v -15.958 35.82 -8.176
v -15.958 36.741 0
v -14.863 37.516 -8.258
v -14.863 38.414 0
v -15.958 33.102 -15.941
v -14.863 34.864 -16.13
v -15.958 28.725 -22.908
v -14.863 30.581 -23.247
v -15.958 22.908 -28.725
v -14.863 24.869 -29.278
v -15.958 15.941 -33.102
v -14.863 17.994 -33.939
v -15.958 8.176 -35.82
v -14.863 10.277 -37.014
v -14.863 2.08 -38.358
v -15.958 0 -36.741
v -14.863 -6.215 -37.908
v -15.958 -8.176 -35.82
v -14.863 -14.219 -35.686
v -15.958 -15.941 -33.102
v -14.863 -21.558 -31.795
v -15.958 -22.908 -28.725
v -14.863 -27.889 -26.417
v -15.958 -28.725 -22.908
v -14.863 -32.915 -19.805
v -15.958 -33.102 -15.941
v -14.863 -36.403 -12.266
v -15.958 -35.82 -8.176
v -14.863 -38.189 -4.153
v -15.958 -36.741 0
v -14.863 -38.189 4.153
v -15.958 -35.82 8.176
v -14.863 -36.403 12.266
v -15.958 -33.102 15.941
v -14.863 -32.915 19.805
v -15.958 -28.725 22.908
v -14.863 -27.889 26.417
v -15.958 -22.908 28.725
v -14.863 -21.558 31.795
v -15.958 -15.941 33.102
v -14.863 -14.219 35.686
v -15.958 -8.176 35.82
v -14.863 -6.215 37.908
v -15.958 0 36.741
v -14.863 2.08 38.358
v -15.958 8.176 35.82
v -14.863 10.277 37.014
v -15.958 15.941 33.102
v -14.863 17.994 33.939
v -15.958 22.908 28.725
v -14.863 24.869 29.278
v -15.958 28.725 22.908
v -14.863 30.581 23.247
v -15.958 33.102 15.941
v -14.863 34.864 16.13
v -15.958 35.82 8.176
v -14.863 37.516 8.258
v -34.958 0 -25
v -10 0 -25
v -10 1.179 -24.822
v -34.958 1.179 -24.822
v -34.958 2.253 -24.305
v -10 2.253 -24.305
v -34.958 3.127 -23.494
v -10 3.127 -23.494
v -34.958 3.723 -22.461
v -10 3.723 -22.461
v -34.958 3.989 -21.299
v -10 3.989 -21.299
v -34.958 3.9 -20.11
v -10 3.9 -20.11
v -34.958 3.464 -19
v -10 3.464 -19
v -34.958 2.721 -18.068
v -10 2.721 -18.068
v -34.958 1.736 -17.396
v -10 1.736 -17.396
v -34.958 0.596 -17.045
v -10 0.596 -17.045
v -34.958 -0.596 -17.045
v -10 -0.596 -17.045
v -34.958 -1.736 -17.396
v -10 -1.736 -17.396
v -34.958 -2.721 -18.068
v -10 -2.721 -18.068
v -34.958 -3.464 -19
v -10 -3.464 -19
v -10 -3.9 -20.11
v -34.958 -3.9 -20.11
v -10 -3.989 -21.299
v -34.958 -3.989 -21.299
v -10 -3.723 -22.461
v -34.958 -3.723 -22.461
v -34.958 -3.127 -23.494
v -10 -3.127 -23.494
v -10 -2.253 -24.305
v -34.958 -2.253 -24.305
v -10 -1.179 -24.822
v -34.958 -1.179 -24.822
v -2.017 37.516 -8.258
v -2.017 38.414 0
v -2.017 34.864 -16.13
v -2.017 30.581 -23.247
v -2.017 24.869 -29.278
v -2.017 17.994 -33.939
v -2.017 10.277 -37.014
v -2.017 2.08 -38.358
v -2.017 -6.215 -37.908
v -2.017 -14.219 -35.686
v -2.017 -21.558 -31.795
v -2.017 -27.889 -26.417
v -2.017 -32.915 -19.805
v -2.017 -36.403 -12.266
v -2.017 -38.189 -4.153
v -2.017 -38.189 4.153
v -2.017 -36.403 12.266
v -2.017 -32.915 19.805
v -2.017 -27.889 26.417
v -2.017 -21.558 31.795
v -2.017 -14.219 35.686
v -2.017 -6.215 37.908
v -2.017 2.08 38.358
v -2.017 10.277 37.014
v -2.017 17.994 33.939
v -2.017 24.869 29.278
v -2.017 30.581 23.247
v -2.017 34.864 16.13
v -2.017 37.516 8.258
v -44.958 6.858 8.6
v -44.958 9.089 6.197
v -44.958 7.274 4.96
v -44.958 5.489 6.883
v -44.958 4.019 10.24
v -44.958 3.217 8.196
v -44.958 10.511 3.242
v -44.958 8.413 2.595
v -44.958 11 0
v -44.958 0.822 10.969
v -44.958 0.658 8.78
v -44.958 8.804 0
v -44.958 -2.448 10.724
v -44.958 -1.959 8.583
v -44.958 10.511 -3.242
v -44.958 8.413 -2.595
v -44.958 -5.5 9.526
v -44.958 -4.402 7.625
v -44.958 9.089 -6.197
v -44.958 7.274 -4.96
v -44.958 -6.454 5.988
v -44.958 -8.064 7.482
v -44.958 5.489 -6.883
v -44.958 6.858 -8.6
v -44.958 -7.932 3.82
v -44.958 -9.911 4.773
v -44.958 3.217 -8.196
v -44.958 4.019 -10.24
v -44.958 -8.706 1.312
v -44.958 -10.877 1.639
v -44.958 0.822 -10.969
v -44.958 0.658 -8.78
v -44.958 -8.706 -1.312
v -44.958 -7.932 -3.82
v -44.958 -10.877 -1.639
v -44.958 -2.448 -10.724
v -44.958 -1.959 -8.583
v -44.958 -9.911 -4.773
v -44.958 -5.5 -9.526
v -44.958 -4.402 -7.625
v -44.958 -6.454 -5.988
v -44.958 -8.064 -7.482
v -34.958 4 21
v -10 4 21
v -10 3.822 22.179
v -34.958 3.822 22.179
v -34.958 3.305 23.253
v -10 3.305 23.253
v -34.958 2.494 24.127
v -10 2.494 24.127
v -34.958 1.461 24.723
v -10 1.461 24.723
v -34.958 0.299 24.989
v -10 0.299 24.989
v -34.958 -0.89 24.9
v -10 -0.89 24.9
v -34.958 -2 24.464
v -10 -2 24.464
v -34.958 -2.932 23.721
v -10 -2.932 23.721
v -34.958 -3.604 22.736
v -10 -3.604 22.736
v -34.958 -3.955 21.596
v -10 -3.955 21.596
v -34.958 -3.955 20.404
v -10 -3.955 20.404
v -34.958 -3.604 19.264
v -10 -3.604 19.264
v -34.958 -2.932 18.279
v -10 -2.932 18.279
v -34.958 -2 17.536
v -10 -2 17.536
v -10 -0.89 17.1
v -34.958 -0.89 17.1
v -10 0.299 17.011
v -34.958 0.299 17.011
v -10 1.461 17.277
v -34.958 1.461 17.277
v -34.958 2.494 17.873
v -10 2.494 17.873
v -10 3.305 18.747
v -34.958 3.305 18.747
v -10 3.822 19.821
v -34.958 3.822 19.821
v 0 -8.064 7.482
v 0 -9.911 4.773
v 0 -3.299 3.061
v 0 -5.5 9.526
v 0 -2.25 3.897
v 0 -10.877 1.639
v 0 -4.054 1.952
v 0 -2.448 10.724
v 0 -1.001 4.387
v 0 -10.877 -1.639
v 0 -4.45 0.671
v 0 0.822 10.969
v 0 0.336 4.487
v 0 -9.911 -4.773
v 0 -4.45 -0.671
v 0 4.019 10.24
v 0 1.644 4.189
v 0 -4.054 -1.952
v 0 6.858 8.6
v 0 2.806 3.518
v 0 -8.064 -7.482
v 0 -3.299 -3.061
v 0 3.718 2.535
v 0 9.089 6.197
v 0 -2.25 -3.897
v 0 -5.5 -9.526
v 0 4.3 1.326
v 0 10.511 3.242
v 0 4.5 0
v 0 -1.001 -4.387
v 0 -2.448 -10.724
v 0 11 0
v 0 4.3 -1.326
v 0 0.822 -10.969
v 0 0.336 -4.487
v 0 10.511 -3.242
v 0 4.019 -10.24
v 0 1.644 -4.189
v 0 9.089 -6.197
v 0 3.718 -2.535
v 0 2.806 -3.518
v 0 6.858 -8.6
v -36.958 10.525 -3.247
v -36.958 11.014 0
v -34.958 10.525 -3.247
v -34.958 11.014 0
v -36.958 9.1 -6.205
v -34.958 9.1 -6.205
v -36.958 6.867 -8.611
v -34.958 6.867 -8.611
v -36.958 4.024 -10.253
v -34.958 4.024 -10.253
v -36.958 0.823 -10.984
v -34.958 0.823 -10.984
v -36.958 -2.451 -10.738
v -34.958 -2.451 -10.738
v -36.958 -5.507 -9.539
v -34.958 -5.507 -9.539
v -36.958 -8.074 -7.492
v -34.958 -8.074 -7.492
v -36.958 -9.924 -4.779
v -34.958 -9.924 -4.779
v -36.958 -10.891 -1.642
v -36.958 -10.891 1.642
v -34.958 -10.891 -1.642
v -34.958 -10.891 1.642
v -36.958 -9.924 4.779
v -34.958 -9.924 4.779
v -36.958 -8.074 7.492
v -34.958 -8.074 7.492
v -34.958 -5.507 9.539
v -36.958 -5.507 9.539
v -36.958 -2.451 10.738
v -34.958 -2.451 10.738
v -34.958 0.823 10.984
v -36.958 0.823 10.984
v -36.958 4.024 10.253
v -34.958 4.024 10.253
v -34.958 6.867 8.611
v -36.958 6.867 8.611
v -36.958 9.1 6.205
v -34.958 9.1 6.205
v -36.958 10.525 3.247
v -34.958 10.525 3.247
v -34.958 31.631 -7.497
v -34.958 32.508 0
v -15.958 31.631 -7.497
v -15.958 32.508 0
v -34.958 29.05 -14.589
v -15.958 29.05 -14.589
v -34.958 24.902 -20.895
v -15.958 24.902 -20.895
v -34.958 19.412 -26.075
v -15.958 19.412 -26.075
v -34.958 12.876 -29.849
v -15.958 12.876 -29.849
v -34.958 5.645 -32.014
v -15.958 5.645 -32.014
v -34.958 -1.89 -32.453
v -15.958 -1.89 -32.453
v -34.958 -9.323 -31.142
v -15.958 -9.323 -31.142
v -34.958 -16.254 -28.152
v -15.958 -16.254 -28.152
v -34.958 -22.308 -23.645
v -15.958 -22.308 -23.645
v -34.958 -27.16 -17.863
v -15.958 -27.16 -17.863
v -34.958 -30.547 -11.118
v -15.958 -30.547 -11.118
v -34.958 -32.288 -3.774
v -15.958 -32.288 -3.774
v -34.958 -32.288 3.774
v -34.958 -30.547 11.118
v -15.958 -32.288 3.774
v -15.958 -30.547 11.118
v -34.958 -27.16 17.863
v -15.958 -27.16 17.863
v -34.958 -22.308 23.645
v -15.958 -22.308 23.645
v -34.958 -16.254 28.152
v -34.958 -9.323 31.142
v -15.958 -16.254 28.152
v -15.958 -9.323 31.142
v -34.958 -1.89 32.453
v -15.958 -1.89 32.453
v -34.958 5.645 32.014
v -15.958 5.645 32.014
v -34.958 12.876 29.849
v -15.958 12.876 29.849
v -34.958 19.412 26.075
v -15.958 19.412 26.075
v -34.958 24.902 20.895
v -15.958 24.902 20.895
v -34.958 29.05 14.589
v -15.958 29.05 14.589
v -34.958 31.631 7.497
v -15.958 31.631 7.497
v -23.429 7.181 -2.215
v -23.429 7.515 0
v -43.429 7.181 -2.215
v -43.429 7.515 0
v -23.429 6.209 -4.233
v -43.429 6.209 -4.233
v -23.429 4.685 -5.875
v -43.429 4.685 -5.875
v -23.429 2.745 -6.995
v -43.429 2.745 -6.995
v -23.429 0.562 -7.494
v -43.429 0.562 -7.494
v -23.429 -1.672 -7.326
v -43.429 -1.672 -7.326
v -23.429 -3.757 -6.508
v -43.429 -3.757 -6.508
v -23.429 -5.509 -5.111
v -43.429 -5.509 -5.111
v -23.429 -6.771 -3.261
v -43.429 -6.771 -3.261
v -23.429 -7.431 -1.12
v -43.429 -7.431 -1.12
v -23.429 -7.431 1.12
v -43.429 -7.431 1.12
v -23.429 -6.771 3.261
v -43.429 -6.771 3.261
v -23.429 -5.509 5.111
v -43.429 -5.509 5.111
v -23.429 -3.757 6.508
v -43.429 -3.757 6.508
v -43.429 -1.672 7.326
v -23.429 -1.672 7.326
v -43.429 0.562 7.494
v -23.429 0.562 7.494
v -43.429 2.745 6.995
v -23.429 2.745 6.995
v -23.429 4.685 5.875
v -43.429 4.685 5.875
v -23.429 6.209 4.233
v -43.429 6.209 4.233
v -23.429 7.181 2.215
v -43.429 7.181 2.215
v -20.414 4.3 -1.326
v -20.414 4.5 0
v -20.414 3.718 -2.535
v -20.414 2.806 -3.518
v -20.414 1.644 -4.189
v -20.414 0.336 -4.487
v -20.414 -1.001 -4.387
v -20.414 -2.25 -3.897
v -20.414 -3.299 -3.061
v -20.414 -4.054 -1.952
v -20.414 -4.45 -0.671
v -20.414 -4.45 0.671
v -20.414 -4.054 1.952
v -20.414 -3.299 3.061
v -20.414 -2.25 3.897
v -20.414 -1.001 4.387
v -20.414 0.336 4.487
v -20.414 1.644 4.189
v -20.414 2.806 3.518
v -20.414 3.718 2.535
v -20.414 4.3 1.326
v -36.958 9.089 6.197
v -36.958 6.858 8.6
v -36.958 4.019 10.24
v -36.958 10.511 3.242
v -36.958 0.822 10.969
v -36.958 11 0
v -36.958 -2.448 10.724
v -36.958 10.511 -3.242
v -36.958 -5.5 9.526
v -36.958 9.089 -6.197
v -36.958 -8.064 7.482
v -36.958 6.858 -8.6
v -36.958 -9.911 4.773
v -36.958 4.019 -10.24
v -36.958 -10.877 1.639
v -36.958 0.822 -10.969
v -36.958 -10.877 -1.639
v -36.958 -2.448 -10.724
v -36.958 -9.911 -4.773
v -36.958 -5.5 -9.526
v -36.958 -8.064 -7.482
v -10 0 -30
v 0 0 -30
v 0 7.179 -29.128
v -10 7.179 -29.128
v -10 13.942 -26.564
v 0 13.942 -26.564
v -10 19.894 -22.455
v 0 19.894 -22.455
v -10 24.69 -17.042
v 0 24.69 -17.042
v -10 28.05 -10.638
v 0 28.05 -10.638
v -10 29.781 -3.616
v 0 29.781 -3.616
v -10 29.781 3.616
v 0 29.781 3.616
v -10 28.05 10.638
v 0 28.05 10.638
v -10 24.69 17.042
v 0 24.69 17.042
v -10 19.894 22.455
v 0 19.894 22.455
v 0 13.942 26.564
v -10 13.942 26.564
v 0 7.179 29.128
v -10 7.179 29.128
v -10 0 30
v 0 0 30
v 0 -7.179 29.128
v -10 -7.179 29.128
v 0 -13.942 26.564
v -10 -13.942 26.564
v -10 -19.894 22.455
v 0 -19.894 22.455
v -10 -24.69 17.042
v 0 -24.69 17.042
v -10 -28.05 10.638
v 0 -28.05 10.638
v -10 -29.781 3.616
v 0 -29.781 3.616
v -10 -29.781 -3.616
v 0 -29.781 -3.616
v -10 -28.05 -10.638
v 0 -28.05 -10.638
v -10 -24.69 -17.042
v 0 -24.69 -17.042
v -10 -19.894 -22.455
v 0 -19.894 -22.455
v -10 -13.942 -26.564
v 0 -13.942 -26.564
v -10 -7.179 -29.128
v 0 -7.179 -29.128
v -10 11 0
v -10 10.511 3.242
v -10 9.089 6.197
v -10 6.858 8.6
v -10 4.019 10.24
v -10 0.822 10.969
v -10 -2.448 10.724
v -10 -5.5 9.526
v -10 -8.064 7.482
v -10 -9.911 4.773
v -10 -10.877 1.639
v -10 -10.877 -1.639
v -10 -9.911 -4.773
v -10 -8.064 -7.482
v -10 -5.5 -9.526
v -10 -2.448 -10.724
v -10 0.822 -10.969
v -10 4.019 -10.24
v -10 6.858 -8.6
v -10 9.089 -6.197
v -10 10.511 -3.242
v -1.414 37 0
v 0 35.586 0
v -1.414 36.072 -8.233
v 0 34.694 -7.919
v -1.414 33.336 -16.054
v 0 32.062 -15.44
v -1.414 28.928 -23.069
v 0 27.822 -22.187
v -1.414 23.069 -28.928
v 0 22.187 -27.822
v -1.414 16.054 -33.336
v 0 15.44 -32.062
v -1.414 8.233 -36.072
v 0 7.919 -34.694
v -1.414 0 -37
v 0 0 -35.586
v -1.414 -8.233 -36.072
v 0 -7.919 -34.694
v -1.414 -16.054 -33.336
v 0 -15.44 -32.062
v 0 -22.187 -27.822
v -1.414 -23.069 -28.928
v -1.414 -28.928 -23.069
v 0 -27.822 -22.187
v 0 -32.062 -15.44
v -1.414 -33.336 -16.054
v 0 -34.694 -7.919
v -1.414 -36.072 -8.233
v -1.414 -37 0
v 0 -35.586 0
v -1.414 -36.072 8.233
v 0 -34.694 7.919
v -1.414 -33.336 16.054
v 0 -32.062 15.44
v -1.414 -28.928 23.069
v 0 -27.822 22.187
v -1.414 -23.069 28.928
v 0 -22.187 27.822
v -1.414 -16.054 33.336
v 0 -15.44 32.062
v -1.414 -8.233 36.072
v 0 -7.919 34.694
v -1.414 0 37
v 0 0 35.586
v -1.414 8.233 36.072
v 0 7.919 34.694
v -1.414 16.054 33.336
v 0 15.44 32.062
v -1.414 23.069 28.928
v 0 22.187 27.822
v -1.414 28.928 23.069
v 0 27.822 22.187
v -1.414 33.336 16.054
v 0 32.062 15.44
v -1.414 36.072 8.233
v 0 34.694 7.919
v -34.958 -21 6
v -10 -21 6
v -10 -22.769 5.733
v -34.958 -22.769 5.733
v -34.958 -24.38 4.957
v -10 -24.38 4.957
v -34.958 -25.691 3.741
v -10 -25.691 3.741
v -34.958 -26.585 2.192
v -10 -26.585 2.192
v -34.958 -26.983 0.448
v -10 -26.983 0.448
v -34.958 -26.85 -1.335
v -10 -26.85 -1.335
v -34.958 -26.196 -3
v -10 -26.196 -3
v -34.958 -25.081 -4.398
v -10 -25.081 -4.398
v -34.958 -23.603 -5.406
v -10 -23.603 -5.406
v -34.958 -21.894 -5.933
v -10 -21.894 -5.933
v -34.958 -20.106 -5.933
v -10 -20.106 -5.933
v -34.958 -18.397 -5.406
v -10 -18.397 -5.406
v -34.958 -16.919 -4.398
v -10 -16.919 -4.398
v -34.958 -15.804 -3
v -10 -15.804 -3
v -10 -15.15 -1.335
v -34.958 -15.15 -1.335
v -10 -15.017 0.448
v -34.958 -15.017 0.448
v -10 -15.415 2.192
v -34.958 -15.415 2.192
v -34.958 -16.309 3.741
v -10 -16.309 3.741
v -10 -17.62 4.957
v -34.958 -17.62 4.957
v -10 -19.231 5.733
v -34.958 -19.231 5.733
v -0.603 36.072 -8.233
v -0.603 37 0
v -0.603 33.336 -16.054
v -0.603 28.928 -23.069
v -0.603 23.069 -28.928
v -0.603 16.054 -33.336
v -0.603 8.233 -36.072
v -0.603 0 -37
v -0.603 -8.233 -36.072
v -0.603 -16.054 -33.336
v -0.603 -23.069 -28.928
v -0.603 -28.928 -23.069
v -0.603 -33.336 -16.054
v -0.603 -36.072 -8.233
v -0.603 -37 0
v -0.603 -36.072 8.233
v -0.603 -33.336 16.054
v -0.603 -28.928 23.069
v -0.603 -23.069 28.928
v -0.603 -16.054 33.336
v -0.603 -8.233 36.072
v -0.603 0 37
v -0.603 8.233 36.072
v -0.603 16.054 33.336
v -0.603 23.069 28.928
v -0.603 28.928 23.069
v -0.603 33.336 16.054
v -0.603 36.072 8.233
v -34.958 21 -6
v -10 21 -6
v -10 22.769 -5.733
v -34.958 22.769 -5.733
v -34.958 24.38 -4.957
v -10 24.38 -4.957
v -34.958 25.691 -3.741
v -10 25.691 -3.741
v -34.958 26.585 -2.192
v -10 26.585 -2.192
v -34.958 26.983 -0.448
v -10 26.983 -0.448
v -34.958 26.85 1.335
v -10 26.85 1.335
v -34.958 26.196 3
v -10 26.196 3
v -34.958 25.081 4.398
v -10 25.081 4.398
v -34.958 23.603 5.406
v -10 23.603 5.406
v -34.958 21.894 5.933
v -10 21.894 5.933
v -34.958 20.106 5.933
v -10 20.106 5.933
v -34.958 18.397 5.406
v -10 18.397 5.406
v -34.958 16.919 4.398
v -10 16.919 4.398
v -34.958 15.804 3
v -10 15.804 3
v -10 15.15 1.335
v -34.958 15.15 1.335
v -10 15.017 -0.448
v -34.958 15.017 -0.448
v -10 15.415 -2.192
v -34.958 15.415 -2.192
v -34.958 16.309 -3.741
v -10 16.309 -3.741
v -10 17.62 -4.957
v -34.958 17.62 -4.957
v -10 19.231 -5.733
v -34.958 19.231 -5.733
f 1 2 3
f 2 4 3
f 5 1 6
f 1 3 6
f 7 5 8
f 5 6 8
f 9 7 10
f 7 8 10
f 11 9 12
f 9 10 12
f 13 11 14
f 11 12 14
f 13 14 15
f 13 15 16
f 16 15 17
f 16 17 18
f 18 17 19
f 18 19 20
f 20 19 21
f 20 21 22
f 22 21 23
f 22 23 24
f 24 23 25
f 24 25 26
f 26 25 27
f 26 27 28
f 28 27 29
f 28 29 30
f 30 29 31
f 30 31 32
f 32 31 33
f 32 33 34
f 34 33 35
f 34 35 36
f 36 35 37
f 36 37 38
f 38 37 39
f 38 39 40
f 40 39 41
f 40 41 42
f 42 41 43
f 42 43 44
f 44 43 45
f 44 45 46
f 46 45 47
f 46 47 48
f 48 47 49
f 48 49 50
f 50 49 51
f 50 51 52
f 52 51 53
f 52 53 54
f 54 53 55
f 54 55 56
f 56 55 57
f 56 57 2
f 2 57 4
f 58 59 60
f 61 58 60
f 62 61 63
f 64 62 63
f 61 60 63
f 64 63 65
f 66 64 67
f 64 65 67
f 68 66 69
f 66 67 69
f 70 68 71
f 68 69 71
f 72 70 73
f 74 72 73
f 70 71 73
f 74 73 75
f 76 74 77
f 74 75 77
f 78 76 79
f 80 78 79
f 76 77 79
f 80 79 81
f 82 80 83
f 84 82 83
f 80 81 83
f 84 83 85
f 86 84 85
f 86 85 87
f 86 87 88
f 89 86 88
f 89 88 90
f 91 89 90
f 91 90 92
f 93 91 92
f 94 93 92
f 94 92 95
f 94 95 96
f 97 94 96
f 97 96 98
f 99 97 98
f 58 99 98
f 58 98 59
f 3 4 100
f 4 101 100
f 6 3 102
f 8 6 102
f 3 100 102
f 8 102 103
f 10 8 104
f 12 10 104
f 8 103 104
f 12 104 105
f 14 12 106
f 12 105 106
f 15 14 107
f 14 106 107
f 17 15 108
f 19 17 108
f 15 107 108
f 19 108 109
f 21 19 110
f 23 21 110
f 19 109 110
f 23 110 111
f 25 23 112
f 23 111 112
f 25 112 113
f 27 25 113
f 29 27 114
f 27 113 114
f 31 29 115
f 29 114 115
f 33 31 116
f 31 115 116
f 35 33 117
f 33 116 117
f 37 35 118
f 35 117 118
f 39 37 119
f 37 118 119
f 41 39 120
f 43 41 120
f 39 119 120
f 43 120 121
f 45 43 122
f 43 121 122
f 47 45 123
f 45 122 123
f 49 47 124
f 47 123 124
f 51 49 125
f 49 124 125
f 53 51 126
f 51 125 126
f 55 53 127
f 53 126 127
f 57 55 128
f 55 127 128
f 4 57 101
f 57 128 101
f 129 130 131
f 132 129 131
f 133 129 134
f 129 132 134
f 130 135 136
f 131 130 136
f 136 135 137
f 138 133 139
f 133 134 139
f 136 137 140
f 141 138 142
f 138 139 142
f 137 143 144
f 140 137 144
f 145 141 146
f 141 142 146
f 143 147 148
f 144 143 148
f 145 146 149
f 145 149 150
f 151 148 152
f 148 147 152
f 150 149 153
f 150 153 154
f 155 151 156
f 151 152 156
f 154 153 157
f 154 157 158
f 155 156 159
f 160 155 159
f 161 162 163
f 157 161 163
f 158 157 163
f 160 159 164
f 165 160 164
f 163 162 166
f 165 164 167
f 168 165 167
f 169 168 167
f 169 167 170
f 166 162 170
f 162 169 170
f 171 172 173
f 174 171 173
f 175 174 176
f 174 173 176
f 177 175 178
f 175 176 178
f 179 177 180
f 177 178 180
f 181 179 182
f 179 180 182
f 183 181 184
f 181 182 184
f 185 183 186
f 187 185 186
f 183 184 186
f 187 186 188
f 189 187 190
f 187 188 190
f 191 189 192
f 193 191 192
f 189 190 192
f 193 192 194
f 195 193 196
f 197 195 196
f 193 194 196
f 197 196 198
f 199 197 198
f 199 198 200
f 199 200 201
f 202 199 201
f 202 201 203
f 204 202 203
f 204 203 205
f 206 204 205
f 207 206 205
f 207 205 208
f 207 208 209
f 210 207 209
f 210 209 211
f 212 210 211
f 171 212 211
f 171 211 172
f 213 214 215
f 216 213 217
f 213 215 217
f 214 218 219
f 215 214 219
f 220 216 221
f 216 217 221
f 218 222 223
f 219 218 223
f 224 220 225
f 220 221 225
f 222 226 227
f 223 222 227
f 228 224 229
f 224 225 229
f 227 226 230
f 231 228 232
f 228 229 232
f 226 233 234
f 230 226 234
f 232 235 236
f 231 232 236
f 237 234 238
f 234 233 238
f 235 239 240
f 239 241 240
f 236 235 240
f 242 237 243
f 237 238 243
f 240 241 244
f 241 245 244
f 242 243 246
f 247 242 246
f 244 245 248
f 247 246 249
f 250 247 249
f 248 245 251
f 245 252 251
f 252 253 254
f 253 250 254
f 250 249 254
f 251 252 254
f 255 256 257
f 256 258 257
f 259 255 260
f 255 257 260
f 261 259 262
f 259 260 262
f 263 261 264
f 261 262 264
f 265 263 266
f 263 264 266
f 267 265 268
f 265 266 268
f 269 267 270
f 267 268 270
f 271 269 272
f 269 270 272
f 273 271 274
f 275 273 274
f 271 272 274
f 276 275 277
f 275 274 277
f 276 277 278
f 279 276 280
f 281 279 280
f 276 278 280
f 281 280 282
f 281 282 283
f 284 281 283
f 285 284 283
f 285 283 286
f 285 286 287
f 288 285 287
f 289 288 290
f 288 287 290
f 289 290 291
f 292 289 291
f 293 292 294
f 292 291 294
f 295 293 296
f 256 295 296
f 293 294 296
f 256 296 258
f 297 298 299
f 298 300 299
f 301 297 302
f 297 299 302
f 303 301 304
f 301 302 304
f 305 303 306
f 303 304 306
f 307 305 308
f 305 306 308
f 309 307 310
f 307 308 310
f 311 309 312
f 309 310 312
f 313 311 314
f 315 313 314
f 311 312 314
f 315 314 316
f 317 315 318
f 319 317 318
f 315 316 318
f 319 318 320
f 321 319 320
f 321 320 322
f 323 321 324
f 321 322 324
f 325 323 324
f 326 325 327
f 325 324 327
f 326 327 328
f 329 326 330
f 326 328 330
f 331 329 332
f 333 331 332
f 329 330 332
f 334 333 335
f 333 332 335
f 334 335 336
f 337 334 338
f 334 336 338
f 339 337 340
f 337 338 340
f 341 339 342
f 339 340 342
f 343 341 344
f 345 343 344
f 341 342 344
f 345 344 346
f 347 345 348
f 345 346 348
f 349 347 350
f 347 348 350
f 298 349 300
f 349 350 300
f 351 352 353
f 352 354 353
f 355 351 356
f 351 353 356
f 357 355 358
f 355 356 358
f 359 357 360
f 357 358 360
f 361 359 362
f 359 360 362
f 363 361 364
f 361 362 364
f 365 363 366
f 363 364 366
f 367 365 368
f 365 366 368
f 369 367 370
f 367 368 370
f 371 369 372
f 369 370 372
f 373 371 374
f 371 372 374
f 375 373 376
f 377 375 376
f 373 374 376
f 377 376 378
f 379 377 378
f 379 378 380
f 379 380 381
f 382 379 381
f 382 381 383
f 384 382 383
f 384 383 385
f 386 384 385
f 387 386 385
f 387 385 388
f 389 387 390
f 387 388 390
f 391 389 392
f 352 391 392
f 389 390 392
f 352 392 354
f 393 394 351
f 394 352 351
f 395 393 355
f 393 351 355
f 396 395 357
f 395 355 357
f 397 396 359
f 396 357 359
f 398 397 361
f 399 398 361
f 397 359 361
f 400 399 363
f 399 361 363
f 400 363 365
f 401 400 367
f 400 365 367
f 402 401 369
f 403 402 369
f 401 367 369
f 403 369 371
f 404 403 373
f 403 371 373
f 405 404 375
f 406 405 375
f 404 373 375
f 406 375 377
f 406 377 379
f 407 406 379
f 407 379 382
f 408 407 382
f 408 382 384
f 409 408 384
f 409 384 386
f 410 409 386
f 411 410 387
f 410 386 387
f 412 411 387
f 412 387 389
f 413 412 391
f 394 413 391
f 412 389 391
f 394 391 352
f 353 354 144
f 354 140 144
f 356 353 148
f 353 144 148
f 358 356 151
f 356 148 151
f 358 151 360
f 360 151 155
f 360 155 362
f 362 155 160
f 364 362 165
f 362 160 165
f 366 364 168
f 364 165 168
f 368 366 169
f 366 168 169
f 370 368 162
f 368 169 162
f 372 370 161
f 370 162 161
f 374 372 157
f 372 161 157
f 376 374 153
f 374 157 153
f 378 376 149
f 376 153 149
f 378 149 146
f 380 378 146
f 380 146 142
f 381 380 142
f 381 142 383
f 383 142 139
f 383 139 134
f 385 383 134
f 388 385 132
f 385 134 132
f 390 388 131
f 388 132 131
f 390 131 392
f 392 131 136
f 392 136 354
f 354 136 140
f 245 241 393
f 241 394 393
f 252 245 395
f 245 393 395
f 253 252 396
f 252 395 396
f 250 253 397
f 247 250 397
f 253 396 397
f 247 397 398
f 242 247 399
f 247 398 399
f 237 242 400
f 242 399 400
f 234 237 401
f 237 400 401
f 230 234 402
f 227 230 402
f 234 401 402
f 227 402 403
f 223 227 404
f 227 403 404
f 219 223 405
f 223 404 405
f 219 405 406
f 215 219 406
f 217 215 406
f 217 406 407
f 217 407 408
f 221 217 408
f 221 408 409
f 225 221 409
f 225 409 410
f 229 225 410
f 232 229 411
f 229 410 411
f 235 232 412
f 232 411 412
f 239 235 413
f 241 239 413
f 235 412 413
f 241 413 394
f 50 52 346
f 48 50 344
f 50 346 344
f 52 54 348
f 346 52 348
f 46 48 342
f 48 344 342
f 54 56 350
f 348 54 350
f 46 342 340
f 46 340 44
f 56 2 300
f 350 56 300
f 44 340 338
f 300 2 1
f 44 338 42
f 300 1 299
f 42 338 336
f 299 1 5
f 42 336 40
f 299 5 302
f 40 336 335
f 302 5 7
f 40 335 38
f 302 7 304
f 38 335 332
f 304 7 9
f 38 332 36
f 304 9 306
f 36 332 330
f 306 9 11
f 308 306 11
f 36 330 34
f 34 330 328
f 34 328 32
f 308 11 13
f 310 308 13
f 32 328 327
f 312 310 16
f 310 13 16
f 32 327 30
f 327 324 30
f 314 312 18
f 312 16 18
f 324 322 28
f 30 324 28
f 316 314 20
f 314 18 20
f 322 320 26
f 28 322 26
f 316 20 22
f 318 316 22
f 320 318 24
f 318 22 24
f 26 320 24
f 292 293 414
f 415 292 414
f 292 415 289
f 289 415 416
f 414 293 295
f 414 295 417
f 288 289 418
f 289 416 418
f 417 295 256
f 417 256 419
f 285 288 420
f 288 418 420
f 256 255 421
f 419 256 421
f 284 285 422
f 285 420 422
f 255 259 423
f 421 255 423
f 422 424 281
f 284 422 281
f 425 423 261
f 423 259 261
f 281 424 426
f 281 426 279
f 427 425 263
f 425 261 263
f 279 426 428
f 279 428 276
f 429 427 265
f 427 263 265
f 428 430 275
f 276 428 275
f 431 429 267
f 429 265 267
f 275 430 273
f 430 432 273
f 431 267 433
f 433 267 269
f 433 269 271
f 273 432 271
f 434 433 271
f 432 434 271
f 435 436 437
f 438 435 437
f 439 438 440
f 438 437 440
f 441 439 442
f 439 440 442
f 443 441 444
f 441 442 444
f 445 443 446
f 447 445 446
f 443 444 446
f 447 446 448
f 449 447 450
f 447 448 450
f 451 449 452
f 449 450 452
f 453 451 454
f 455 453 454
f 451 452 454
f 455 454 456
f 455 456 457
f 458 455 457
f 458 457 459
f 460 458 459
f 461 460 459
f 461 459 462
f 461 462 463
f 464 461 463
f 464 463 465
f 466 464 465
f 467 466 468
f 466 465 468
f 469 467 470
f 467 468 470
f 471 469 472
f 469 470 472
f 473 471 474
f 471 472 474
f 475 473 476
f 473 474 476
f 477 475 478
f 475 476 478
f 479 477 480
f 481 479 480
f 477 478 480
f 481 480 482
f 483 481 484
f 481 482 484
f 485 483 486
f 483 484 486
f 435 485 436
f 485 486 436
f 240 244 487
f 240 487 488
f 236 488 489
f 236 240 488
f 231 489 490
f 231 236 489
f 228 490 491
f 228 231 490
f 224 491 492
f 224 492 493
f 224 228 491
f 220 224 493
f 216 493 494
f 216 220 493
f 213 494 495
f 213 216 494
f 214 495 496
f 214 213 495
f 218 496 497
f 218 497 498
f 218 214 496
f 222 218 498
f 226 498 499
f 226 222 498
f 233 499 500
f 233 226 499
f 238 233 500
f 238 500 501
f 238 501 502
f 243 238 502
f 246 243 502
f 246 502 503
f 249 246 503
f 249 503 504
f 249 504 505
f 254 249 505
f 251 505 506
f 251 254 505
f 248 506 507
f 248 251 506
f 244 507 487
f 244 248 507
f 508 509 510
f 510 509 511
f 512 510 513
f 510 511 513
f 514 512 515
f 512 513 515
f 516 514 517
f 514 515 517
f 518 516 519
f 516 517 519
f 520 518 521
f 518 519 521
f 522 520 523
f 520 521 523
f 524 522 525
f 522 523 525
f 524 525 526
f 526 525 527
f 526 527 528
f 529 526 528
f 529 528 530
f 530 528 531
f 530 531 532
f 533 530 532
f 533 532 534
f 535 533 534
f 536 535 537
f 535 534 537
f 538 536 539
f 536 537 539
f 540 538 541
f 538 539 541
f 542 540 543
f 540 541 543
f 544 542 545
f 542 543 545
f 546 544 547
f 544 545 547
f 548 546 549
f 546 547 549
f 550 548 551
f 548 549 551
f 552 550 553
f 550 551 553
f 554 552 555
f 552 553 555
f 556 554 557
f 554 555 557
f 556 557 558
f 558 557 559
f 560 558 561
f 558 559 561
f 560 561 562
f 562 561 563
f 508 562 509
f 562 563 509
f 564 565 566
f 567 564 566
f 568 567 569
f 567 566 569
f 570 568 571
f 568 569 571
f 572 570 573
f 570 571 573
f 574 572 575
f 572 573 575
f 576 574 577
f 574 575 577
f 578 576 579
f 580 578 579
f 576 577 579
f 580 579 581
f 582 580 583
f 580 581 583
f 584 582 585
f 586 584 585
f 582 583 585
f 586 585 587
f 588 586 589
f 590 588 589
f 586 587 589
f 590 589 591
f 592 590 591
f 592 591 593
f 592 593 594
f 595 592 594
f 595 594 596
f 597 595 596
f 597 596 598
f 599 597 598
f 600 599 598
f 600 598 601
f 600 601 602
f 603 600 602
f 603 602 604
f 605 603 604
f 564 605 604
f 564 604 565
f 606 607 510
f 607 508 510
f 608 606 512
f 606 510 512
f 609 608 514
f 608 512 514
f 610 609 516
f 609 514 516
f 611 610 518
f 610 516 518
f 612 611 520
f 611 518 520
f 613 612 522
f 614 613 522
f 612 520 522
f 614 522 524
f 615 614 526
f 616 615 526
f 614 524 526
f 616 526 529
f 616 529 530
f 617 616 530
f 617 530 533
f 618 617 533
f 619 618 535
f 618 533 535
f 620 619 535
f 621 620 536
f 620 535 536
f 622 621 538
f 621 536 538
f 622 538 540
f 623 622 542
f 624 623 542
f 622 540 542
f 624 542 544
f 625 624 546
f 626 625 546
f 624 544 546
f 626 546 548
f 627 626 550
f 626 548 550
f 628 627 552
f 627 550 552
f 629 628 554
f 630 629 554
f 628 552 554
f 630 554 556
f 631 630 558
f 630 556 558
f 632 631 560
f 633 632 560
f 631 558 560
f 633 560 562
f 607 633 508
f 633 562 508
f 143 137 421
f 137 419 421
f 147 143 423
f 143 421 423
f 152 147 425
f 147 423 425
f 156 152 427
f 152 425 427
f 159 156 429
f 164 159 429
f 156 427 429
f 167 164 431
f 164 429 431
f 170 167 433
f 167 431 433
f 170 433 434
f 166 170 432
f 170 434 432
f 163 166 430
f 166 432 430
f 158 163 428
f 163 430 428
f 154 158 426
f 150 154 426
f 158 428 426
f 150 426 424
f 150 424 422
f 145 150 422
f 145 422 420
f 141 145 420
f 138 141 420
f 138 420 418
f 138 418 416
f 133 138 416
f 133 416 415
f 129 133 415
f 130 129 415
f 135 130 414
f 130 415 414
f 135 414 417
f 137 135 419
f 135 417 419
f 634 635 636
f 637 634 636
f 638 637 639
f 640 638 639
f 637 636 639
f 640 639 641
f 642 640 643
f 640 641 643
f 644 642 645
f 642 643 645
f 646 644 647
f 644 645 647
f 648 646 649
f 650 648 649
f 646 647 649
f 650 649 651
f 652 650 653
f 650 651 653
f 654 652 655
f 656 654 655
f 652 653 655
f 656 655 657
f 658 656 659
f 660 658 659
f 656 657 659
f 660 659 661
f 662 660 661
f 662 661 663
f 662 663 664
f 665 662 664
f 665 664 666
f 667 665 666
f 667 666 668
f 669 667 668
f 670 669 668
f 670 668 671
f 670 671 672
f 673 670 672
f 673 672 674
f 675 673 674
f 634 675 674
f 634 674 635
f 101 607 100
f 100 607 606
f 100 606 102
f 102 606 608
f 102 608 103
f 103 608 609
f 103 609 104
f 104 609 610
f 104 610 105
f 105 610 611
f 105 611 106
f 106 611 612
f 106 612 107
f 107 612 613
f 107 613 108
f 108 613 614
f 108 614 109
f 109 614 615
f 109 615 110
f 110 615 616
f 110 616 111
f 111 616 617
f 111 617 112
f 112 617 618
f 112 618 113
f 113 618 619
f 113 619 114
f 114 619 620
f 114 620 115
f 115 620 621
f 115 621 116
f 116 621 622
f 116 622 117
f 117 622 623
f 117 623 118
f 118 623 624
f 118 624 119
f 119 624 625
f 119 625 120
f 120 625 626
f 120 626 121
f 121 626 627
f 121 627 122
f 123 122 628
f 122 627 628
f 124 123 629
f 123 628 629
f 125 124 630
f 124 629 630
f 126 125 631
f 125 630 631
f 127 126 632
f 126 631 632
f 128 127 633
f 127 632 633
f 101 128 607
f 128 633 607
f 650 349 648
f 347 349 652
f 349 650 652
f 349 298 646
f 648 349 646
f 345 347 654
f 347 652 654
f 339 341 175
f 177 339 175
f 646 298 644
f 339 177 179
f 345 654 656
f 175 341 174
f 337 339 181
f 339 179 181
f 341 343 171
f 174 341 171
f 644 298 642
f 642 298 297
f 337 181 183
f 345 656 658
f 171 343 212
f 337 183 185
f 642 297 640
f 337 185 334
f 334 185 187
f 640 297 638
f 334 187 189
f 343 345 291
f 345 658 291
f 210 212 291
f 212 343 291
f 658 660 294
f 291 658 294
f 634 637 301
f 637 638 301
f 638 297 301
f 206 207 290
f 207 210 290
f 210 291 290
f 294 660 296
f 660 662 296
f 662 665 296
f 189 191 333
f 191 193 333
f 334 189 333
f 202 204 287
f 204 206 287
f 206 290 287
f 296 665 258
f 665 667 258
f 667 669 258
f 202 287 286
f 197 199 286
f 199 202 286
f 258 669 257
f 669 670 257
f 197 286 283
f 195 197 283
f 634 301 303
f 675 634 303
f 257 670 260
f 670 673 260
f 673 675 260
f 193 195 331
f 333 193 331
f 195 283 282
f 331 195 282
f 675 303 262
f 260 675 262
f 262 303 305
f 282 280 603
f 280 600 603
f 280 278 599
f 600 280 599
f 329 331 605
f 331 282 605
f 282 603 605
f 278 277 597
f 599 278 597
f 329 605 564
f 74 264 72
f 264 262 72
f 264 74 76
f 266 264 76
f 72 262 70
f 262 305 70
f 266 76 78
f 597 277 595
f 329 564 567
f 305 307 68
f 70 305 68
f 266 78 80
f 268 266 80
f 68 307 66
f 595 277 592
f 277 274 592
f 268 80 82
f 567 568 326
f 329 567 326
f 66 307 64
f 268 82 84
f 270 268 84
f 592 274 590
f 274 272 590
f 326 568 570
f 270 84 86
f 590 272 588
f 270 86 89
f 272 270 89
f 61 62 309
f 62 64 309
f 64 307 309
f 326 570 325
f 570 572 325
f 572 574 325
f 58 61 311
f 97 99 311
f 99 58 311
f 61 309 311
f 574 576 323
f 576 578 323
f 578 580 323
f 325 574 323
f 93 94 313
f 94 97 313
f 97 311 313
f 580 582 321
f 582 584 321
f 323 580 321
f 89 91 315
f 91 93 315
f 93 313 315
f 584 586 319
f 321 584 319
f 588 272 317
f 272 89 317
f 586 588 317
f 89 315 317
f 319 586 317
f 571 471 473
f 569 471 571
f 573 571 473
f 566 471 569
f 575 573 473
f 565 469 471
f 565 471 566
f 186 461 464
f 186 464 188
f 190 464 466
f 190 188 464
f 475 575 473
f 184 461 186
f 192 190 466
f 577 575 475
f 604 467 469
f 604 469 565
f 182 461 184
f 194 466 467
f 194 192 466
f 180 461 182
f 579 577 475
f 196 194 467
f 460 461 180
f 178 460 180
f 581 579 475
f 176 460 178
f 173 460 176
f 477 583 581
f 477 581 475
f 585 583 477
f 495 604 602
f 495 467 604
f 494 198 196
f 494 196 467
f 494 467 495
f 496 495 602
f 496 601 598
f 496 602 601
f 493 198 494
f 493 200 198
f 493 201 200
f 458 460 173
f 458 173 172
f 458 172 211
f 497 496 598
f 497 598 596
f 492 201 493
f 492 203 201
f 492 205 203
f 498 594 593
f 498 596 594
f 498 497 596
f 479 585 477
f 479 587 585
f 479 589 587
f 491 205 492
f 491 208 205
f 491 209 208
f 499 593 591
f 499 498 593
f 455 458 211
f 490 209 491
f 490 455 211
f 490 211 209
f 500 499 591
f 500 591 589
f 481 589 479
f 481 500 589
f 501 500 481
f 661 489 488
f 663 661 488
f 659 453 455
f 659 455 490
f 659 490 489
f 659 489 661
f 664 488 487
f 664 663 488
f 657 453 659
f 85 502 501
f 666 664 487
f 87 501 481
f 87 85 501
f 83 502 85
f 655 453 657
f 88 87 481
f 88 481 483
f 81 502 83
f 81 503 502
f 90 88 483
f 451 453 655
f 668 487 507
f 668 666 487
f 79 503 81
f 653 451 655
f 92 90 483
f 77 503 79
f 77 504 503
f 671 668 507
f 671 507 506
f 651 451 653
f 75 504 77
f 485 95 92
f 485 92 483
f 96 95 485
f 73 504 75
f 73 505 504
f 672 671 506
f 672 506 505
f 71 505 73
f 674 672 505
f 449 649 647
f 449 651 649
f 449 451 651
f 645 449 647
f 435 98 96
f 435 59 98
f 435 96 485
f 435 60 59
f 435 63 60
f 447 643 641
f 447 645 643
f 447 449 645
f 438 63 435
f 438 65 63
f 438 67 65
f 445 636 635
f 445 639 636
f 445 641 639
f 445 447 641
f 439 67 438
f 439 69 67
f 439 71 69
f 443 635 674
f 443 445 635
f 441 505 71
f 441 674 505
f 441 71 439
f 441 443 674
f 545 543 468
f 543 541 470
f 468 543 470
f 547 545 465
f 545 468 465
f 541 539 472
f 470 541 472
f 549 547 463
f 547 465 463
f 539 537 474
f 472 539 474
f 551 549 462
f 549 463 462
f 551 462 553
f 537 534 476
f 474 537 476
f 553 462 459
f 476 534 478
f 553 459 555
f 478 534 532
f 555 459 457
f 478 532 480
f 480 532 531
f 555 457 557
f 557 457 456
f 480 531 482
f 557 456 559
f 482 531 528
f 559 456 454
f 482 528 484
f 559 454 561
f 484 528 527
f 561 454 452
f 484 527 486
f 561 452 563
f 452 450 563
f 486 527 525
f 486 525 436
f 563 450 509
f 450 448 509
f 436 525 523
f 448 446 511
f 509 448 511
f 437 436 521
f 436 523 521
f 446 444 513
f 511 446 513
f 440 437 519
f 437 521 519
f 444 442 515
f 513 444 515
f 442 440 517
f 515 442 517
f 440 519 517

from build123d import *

# Parameters (mm, degrees)
ESQUISSE2_R                  = 30
ESQUISSE2_R_2                = 11
ENL_V_MAT_EXTRU_2_DEPTH      = 10
ESQUISSE4_R                  = 4
ENL_V_MAT_EXTRU_3_DEPTH      = 65.601563534
ESQUISSE5_R                  = 6
ENL_V_MAT_EXTRU_4_DEPTH      = 65.601563534
R_P_TITION_CIRCULAIRE1_COUNT = 2
R_P_TITION_CIRCULAIRE1_ANGLE = 180


with BuildPart() as part:
    # Esquisse1 → Révolution1 (revolve)
    with BuildSketch(Plane.XY, mode=Mode.PRIVATE) as r_volution1_sk:
        Polygon((-0.603091605, -37), (-1.414213562, -37), (0, -35.585786438), (0, -4.5), (-20.414163341, -4.5), (-23.429029468, -7.514866127), (-43.429029468, -7.514866127), (-44.957951939, -8.804205522), (-44.957951939, -11), (-36.957951939, -11), (-36.957951939, -11.014343795), (-34.957951939, -11.014343795), (-34.957951939, -15.337655327), (-34.957951939, -27.510373989), (-34.957951939, -32.507595335), (-15.957951939, -32.507595335), (-15.957951939, -36.740873266), (-14.862537746, -38.414213562), (-2.017305168, -38.414213562), align=None)
    revolve(r_volution1_sk.sketch.rotate(Axis((0, 0, 0), (-1, 0, 0)), 180), axis=Axis((0, 0, 0), (-1, 0, 0)))

    # Esquisse2 → Enlèv. mat.-Extru.2 (cut)
    with BuildSketch(Plane(origin=(0, 0, 0), x_dir=(0, 0, -1), z_dir=(1, 0, 0))):
        Circle(ESQUISSE2_R)
        with Locations(Location((0, 0, 0), (0, 0, 90))):
            Circle(ESQUISSE2_R_2, mode=Mode.SUBTRACT)
    extrude(amount=-ENL_V_MAT_EXTRU_2_DEPTH, mode=Mode.SUBTRACT)

    # Esquisse4 → Enlèv. mat.-Extru.3 (cut, through all)
    with BuildSketch(Plane(origin=(-10, 0, 0), x_dir=(0, 0, -1), z_dir=(1, 0, 0))):
        with Locations((21, 0)):
            Circle(ESQUISSE4_R)
        with Locations(Location((-21, 0, 0), (0, 0, 90))):
            Circle(ESQUISSE4_R)
    extrude(amount=-ENL_V_MAT_EXTRU_3_DEPTH, mode=Mode.SUBTRACT)

    # Esquisse5 → Enlèv. mat.-Extru.4 (cut, through all)
    with BuildSketch(Plane(origin=(-10, 0, 0), x_dir=(0, 0, -1), z_dir=(1, 0, 0))):
        with Locations((0, 21)):
            Circle(ESQUISSE5_R)
    enl_v_mat_extru_4 = extrude(amount=-ENL_V_MAT_EXTRU_4_DEPTH, mode=Mode.SUBTRACT)

    # Répétition circulaire1: Enlèv. mat.-Extru.4 ×2 about axis
    r_p_tition_circulaire1_axis = Axis((0, 0, 0), (1, 0, 0))
    for i in range(1, R_P_TITION_CIRCULAIRE1_COUNT):
        add(enl_v_mat_extru_4.rotate(r_p_tition_circulaire1_axis, i * R_P_TITION_CIRCULAIRE1_ANGLE / (R_P_TITION_CIRCULAIRE1_COUNT - 1)), mode=Mode.SUBTRACT)


solid = part.part
